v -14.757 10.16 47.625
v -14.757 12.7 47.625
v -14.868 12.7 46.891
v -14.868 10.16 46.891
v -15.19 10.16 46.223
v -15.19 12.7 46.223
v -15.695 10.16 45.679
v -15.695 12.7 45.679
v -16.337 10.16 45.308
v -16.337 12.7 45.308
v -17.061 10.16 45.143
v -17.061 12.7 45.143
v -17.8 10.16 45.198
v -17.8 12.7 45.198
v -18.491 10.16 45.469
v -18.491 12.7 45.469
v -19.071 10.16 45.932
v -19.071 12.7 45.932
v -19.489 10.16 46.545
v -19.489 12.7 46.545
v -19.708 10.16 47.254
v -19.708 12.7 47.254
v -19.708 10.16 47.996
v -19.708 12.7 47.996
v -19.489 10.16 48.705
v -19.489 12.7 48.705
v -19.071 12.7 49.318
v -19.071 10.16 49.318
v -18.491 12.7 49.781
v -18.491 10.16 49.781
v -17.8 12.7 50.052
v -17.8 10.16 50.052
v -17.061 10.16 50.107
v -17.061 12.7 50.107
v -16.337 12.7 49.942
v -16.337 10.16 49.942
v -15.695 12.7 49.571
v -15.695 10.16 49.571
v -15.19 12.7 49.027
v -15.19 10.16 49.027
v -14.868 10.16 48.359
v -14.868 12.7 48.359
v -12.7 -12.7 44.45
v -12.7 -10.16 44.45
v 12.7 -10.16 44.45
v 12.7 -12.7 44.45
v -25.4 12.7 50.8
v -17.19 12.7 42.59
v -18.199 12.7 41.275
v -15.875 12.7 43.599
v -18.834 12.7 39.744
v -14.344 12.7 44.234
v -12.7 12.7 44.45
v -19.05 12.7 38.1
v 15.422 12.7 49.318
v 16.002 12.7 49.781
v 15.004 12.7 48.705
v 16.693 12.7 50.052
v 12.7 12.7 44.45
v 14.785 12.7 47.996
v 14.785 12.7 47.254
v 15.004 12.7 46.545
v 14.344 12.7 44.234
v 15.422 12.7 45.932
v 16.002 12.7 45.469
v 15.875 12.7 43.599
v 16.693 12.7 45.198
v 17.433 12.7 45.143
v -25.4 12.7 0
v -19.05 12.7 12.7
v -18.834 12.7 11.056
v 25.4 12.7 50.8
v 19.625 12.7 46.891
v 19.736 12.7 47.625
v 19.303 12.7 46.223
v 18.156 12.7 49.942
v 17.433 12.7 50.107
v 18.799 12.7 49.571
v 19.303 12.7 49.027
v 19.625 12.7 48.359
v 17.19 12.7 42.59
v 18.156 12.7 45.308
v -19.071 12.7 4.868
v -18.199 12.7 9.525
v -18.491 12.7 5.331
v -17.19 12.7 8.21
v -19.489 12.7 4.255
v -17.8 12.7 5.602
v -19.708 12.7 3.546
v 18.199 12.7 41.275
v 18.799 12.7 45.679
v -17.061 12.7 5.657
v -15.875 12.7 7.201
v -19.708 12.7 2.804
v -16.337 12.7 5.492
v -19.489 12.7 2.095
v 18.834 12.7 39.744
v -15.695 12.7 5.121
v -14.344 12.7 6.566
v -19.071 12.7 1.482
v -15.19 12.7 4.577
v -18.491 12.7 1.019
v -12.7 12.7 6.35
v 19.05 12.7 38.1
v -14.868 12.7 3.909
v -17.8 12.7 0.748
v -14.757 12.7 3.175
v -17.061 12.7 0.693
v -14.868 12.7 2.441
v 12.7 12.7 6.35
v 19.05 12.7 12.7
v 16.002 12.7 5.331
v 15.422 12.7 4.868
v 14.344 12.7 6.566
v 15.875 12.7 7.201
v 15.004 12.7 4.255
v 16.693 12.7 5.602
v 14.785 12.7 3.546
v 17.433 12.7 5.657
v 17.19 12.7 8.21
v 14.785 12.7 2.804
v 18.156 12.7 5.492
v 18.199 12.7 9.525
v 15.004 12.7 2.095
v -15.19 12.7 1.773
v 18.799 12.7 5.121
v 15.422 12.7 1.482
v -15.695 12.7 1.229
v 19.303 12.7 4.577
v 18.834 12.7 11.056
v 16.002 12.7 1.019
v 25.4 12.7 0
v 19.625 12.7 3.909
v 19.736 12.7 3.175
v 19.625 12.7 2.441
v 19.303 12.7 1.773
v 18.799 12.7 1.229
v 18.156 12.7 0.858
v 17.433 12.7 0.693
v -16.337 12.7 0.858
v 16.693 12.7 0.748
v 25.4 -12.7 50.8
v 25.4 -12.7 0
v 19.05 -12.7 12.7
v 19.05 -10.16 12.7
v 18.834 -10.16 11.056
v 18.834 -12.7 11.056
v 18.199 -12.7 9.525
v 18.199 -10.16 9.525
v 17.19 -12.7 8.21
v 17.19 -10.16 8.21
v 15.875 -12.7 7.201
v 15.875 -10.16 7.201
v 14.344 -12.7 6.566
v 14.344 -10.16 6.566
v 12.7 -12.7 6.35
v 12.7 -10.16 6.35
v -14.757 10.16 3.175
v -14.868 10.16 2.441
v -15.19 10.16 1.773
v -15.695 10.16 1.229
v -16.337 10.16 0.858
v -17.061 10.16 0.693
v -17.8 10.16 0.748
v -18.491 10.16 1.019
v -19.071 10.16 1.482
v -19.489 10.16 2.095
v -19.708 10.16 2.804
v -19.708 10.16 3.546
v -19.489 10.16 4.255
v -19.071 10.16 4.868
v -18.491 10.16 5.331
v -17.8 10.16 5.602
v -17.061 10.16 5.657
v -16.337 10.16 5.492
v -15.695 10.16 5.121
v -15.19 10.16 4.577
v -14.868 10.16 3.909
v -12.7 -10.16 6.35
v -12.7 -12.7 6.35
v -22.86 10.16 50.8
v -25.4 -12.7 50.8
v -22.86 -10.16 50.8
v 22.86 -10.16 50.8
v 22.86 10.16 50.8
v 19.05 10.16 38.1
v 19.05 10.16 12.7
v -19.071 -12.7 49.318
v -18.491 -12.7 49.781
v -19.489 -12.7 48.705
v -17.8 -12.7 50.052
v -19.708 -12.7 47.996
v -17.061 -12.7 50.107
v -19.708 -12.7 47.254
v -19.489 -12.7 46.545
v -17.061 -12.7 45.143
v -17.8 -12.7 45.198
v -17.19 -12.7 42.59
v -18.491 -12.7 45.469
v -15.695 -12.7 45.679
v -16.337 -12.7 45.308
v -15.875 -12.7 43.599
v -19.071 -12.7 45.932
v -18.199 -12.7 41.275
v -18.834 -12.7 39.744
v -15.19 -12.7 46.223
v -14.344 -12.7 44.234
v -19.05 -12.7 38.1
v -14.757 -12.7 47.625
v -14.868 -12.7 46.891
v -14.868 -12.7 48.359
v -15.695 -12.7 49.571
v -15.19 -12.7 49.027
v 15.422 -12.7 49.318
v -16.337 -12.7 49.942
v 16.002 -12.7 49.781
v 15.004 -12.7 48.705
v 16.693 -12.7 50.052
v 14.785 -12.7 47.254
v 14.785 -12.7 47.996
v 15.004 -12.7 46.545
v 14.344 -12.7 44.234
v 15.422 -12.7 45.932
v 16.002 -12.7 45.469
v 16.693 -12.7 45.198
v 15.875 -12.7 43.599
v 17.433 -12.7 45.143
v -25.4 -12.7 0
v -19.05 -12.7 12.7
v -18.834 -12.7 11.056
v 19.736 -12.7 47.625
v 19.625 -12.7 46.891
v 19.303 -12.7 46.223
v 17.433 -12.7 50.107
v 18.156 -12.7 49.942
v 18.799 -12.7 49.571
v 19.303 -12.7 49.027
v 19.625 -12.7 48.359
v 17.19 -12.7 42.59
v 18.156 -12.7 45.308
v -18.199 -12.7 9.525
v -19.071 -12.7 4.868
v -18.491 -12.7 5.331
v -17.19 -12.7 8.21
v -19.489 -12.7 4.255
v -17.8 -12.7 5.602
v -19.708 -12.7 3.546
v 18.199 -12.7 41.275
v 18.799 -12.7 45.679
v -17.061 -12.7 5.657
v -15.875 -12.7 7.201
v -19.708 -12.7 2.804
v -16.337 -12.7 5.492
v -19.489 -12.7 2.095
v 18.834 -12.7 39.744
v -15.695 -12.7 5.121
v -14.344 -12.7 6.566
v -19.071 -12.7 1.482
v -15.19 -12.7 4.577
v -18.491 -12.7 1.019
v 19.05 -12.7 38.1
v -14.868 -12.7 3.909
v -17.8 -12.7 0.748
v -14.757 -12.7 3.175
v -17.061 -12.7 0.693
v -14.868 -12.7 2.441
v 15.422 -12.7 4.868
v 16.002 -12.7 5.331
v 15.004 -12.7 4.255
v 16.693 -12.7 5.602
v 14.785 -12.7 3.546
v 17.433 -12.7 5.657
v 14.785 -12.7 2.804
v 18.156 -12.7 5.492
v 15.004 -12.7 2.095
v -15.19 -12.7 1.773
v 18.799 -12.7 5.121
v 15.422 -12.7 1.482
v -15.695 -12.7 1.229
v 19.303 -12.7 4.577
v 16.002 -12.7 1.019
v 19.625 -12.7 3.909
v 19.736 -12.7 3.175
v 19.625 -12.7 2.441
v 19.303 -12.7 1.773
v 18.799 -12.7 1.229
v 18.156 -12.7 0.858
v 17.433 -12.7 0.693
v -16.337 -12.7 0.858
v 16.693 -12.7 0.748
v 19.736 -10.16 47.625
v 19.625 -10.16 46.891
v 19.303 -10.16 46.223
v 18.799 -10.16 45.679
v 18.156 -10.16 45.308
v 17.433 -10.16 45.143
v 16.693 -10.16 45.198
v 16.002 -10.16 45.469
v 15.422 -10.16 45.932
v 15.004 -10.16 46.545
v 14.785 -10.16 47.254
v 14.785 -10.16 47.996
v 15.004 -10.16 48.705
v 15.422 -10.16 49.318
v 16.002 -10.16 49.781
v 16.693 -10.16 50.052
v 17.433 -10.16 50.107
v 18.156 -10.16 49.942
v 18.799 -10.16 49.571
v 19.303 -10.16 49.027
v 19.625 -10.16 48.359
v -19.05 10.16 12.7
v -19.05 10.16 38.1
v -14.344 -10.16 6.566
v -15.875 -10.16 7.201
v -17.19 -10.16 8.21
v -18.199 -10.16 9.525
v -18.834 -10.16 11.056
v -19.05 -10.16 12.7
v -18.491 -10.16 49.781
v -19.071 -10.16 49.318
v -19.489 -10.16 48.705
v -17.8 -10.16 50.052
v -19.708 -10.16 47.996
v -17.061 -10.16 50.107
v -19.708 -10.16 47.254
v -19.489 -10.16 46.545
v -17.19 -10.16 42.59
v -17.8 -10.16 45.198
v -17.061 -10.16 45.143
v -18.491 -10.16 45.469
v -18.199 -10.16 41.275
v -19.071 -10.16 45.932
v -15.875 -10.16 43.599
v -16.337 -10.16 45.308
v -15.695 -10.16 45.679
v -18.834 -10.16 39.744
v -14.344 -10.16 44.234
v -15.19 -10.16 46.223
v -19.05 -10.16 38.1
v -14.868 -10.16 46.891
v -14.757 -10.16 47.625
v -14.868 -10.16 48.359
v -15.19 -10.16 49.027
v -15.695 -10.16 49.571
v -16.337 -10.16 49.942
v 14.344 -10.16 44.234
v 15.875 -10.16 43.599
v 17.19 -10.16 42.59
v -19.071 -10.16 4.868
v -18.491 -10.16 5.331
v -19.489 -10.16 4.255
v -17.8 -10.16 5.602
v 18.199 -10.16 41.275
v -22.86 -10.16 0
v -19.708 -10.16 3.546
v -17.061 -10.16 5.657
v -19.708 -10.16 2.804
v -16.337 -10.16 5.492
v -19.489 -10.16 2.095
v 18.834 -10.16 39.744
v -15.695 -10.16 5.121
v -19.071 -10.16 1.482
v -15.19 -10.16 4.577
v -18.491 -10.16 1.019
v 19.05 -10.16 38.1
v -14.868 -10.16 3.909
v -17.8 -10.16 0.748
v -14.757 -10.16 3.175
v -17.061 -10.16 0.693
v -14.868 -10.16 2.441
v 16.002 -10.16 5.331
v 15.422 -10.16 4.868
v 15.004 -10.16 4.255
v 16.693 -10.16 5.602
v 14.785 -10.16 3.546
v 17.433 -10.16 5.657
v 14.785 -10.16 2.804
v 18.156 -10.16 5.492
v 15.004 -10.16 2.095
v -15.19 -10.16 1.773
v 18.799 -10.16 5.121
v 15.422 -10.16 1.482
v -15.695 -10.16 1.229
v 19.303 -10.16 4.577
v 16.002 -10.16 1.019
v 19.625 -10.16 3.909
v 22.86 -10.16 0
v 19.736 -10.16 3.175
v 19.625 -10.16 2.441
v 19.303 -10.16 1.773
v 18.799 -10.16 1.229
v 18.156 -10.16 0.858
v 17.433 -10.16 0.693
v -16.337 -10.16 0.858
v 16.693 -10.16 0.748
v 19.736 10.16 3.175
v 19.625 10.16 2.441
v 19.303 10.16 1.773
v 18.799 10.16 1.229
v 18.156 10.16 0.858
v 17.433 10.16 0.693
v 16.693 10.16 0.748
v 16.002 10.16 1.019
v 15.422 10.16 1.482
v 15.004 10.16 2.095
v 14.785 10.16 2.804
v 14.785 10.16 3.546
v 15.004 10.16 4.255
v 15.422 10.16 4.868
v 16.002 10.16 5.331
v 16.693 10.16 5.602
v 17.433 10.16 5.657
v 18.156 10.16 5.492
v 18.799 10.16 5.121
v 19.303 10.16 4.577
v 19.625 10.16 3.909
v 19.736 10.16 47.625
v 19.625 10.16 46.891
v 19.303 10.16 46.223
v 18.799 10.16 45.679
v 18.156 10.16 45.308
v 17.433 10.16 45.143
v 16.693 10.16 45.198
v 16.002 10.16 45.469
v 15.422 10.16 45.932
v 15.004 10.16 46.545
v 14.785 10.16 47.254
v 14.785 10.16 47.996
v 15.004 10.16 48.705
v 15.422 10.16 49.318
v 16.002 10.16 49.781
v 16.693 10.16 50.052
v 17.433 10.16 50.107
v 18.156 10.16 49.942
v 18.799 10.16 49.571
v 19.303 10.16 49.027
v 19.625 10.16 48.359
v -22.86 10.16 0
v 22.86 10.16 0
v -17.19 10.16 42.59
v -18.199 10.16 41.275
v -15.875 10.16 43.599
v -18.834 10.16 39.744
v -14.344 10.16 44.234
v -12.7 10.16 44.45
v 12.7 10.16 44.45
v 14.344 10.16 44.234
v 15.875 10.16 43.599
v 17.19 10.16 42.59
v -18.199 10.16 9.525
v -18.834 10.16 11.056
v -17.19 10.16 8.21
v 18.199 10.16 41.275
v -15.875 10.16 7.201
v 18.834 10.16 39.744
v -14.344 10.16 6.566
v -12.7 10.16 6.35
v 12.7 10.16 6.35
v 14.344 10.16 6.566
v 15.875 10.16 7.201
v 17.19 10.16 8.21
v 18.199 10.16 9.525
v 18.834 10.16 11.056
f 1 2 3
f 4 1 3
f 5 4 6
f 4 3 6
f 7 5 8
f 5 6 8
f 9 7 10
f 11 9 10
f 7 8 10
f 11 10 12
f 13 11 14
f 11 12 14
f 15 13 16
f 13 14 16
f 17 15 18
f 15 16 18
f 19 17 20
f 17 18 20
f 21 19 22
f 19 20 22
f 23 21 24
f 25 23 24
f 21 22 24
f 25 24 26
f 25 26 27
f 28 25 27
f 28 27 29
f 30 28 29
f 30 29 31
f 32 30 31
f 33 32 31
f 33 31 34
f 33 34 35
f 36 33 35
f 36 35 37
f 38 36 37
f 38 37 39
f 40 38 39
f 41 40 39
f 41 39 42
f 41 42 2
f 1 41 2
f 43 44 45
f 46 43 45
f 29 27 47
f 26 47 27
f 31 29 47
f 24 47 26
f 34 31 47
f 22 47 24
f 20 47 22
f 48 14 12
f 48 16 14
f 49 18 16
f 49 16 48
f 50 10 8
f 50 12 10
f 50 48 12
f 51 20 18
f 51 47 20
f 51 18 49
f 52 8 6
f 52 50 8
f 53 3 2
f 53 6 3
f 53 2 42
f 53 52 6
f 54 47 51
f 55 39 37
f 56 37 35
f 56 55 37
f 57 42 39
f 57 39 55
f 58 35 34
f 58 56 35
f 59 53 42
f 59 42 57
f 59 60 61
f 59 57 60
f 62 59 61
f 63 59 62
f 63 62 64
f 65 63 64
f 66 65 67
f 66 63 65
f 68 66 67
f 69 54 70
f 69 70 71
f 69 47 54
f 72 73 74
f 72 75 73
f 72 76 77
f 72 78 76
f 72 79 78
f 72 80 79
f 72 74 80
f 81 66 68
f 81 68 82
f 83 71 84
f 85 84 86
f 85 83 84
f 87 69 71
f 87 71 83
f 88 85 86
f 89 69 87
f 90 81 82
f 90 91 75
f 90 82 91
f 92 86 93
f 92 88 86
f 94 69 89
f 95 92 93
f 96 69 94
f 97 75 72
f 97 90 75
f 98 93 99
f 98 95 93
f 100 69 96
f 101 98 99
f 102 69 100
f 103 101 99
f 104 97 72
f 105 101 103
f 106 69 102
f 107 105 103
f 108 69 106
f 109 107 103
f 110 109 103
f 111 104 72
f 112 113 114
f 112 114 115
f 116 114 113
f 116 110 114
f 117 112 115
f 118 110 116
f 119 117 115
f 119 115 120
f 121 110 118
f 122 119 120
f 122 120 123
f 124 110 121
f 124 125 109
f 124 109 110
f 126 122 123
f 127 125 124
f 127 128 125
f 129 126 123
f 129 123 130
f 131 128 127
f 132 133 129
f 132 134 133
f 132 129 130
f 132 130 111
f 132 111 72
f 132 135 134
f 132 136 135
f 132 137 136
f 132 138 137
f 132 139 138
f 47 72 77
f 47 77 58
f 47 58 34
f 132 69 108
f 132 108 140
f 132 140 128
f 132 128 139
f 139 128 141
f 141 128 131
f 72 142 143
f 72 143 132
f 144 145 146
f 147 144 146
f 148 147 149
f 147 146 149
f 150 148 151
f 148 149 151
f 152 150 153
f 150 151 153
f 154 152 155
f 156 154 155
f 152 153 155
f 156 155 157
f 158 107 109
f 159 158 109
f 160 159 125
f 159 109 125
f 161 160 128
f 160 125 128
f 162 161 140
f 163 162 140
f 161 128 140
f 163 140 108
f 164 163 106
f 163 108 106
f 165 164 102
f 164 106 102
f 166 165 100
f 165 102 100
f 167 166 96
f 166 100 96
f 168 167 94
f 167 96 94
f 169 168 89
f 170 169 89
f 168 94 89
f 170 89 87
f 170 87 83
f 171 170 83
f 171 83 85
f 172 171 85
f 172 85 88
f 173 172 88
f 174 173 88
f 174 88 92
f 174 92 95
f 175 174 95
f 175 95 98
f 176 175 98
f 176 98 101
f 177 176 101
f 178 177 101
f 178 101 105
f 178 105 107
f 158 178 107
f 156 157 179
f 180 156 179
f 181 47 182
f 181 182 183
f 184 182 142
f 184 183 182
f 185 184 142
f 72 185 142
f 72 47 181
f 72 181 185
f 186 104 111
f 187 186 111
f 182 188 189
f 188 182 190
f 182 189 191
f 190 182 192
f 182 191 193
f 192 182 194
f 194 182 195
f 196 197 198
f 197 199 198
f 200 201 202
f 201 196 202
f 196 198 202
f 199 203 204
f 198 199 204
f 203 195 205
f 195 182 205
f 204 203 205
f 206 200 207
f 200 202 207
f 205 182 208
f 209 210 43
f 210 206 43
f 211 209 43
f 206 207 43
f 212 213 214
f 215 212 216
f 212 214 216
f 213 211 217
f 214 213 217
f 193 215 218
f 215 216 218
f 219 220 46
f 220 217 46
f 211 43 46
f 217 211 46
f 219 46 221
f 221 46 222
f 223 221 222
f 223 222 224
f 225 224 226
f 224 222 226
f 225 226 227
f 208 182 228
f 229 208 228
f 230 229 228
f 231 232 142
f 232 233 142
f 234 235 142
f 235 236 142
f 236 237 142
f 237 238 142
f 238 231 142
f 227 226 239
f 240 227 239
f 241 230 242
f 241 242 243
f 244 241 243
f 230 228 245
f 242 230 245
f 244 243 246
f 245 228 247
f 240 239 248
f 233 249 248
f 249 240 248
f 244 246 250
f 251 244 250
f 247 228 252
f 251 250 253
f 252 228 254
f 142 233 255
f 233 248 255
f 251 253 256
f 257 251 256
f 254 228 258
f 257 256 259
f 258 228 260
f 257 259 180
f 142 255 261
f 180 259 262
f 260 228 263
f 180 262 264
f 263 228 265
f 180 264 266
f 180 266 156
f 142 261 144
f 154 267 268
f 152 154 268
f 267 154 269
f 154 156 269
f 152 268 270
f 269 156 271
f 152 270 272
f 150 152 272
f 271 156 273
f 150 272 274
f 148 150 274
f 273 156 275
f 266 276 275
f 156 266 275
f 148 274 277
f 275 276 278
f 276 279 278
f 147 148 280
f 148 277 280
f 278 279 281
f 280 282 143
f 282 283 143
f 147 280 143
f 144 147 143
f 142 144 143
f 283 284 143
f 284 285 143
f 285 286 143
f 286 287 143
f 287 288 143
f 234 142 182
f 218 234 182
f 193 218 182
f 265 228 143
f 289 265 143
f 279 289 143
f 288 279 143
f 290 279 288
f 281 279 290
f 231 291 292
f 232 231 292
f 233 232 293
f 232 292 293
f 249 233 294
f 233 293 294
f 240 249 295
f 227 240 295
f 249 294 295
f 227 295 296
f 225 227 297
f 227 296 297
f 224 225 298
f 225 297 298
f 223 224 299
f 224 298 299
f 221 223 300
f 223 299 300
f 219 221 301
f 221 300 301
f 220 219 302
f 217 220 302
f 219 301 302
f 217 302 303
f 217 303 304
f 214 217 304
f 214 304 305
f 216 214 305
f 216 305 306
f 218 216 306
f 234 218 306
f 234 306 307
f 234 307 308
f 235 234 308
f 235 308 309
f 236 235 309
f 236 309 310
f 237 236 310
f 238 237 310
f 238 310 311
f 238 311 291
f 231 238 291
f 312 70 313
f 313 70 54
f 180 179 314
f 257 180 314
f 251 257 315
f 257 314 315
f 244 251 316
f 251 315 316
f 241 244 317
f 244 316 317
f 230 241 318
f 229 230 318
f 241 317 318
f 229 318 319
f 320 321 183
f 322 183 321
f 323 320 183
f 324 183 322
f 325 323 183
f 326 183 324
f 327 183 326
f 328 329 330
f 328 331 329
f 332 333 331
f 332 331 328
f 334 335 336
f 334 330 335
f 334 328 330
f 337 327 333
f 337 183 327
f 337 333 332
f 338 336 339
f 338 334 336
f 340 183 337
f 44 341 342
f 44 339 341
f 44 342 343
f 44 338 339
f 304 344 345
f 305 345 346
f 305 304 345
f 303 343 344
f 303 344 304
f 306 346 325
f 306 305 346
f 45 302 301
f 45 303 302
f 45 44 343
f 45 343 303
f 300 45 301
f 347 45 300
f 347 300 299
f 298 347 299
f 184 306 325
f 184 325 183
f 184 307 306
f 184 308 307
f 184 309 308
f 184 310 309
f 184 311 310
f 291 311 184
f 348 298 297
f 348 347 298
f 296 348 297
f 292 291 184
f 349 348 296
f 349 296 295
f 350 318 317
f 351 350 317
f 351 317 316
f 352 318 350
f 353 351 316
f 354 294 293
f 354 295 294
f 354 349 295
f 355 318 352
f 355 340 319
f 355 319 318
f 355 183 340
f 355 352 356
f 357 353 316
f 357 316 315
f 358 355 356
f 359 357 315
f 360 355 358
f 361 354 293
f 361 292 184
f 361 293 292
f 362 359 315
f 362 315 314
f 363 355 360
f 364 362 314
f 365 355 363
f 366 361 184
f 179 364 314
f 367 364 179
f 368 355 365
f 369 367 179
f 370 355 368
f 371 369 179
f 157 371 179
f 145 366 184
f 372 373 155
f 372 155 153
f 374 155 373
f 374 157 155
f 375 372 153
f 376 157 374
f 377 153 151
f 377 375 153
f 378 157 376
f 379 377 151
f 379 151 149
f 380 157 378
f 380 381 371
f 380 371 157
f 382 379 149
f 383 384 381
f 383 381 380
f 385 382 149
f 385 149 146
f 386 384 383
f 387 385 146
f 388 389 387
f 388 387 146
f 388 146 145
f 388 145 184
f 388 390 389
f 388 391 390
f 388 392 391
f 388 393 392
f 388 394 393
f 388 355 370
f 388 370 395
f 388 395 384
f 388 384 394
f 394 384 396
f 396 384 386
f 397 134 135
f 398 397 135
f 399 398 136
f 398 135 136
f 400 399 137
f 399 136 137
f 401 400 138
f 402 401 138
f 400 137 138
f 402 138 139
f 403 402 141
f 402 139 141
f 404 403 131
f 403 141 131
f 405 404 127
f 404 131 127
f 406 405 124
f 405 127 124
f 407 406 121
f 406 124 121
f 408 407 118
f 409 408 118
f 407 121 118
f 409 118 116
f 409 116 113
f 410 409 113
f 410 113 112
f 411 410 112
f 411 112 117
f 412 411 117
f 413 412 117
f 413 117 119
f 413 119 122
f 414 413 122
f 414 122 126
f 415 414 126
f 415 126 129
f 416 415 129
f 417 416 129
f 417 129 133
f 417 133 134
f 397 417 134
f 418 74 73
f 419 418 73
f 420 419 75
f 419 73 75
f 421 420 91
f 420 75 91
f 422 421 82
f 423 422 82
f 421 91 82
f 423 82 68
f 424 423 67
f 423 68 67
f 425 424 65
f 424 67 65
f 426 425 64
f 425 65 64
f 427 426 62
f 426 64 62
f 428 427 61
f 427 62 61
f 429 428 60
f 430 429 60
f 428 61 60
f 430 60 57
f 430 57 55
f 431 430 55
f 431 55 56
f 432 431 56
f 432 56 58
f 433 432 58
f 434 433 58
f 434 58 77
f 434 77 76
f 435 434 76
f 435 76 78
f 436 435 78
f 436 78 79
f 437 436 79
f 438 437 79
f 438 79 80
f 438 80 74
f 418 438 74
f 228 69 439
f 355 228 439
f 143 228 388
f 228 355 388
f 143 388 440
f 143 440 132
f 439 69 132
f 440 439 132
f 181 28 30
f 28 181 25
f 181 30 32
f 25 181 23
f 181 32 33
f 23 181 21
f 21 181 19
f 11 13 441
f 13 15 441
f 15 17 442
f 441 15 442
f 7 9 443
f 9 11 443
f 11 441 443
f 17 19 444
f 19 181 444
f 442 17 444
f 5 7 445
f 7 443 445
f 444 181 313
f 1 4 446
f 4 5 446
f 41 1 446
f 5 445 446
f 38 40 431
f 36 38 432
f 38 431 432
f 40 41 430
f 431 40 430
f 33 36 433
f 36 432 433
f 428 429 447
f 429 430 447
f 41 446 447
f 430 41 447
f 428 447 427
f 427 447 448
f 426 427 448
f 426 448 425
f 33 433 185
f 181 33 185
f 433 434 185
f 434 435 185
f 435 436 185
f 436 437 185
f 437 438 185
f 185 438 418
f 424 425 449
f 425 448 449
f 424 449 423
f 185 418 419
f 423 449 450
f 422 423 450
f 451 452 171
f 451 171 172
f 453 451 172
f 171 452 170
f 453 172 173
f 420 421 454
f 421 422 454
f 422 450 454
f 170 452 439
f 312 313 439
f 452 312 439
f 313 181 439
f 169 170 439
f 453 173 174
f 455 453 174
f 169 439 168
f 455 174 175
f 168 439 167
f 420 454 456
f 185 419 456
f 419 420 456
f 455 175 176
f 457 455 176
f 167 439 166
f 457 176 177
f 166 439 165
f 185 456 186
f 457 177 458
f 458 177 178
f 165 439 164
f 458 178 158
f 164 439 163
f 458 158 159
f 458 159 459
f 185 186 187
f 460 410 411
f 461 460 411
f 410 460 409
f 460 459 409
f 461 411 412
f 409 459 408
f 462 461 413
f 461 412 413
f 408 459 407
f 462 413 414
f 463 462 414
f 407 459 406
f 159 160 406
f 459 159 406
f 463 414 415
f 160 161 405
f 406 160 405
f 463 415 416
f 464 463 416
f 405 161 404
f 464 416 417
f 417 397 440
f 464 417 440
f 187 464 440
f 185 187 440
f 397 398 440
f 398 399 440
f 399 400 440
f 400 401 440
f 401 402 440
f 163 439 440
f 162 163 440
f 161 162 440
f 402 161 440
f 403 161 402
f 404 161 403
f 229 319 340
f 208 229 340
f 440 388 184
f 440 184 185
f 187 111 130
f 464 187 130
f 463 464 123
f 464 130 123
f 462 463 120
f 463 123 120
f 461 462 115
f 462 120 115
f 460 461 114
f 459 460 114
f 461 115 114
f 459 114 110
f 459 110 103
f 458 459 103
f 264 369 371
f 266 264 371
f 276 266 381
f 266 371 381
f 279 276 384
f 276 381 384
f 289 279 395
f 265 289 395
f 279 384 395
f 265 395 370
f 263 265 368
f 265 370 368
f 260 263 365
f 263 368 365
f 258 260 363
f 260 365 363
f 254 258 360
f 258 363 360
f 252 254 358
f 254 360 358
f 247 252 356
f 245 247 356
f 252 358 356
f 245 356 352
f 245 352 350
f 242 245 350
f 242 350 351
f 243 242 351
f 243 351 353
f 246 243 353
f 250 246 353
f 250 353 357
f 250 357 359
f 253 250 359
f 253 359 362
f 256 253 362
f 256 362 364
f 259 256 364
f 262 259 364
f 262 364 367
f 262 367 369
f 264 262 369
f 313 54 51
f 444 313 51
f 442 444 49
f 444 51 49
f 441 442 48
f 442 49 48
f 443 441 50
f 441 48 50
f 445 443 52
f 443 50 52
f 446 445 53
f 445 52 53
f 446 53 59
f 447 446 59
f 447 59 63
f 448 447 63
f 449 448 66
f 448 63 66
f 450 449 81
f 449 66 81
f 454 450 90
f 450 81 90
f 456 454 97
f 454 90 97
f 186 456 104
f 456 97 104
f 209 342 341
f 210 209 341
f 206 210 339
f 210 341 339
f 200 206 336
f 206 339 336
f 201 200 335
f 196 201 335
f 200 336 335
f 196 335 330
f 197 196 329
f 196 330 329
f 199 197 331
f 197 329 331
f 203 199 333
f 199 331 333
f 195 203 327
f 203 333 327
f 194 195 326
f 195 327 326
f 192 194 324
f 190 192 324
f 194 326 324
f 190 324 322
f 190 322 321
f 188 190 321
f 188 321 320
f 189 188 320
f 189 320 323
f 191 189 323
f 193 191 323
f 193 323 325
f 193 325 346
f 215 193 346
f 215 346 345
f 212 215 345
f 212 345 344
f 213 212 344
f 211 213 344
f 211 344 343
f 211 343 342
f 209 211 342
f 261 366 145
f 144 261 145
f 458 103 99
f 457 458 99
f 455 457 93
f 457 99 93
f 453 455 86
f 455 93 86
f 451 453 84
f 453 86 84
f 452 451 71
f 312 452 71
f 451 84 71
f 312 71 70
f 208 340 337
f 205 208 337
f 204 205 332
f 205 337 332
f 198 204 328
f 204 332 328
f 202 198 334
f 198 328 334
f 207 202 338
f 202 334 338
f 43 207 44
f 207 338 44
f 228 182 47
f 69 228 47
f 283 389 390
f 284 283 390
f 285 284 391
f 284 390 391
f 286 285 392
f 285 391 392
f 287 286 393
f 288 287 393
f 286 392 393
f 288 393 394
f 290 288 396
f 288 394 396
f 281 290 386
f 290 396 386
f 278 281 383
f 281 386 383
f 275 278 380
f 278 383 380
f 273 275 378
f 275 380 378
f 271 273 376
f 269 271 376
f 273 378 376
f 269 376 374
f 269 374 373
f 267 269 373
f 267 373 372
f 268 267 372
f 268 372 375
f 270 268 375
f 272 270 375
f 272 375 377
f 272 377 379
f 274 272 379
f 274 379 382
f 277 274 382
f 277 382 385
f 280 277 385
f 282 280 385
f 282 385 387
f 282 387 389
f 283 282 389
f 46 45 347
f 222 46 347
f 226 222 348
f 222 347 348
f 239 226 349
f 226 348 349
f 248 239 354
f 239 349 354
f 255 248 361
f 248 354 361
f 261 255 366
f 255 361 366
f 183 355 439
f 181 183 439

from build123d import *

# Parameters (mm, degrees)
SKETCH1_W           = 50.8
SKETCH1_H           = 25.4
SKETCH1_W_2         = 45.72
SKETCH1_H_2         = 20.32
EXTRUDE_THIN1_DEPTH = 50.8
CUT_EXTRUDE1_DEPTH  = 26.4
SKETCH3_R           = 2.4892
CUT_EXTRUDE2_DEPTH  = 26.4


with BuildPart() as part:
    # Sketch1 → Extrude-Thin1 (new body)
    with BuildSketch(Plane.XY):
        Rectangle(SKETCH1_W, SKETCH1_H)
        Rectangle(SKETCH1_W_2, SKETCH1_H_2, mode=Mode.SUBTRACT)
    extrude(amount=EXTRUDE_THIN1_DEPTH)

    # Sketch2 → Cut-Extrude1 (cut, through all)
    with BuildSketch(Plane(origin=(0, 12.7, 0), x_dir=(1, 0, 0), z_dir=(0, 1, 0))):
        with BuildLine():
            ThreePointArc((12.7, -44.45), (17.190128061, -42.590128061), (19.05, -38.1))
            Line((19.05, -38.1), (19.05, -12.7))
            ThreePointArc((19.05, -12.7), (17.190128061, -8.209871939), (12.7, -6.35))
            Line((12.7, -6.35), (-12.7, -6.35))
            ThreePointArc((-12.7, -6.35), (-17.190128061, -8.209871939), (-19.05, -12.7))
            Line((-19.05, -12.7), (-19.05, -38.1))
            ThreePointArc((-19.05, -38.1), (-17.190128061, -42.590128061), (-12.7, -44.45))
            Line((-12.7, -44.45), (12.7, -44.45))
        make_face()
    extrude(amount=-CUT_EXTRUDE1_DEPTH, mode=Mode.SUBTRACT)

    # Sketch3 → Cut-Extrude2 (cut, through all)
    with BuildSketch(Plane(origin=(0, 12.7, 0), x_dir=(1, 0, 0), z_dir=(0, 1, 0))):
        with Locations((-17.2466, -47.625)):
            Circle(SKETCH3_R)
        with Locations((17.2466, -47.625)):
            Circle(SKETCH3_R)
        with Locations((17.2466, -3.175)):
            Circle(SKETCH3_R)
        with Locations((-17.2466, -3.175)):
            Circle(SKETCH3_R)
    extrude(amount=-CUT_EXTRUDE2_DEPTH, mode=Mode.SUBTRACT)


solid = part.part
